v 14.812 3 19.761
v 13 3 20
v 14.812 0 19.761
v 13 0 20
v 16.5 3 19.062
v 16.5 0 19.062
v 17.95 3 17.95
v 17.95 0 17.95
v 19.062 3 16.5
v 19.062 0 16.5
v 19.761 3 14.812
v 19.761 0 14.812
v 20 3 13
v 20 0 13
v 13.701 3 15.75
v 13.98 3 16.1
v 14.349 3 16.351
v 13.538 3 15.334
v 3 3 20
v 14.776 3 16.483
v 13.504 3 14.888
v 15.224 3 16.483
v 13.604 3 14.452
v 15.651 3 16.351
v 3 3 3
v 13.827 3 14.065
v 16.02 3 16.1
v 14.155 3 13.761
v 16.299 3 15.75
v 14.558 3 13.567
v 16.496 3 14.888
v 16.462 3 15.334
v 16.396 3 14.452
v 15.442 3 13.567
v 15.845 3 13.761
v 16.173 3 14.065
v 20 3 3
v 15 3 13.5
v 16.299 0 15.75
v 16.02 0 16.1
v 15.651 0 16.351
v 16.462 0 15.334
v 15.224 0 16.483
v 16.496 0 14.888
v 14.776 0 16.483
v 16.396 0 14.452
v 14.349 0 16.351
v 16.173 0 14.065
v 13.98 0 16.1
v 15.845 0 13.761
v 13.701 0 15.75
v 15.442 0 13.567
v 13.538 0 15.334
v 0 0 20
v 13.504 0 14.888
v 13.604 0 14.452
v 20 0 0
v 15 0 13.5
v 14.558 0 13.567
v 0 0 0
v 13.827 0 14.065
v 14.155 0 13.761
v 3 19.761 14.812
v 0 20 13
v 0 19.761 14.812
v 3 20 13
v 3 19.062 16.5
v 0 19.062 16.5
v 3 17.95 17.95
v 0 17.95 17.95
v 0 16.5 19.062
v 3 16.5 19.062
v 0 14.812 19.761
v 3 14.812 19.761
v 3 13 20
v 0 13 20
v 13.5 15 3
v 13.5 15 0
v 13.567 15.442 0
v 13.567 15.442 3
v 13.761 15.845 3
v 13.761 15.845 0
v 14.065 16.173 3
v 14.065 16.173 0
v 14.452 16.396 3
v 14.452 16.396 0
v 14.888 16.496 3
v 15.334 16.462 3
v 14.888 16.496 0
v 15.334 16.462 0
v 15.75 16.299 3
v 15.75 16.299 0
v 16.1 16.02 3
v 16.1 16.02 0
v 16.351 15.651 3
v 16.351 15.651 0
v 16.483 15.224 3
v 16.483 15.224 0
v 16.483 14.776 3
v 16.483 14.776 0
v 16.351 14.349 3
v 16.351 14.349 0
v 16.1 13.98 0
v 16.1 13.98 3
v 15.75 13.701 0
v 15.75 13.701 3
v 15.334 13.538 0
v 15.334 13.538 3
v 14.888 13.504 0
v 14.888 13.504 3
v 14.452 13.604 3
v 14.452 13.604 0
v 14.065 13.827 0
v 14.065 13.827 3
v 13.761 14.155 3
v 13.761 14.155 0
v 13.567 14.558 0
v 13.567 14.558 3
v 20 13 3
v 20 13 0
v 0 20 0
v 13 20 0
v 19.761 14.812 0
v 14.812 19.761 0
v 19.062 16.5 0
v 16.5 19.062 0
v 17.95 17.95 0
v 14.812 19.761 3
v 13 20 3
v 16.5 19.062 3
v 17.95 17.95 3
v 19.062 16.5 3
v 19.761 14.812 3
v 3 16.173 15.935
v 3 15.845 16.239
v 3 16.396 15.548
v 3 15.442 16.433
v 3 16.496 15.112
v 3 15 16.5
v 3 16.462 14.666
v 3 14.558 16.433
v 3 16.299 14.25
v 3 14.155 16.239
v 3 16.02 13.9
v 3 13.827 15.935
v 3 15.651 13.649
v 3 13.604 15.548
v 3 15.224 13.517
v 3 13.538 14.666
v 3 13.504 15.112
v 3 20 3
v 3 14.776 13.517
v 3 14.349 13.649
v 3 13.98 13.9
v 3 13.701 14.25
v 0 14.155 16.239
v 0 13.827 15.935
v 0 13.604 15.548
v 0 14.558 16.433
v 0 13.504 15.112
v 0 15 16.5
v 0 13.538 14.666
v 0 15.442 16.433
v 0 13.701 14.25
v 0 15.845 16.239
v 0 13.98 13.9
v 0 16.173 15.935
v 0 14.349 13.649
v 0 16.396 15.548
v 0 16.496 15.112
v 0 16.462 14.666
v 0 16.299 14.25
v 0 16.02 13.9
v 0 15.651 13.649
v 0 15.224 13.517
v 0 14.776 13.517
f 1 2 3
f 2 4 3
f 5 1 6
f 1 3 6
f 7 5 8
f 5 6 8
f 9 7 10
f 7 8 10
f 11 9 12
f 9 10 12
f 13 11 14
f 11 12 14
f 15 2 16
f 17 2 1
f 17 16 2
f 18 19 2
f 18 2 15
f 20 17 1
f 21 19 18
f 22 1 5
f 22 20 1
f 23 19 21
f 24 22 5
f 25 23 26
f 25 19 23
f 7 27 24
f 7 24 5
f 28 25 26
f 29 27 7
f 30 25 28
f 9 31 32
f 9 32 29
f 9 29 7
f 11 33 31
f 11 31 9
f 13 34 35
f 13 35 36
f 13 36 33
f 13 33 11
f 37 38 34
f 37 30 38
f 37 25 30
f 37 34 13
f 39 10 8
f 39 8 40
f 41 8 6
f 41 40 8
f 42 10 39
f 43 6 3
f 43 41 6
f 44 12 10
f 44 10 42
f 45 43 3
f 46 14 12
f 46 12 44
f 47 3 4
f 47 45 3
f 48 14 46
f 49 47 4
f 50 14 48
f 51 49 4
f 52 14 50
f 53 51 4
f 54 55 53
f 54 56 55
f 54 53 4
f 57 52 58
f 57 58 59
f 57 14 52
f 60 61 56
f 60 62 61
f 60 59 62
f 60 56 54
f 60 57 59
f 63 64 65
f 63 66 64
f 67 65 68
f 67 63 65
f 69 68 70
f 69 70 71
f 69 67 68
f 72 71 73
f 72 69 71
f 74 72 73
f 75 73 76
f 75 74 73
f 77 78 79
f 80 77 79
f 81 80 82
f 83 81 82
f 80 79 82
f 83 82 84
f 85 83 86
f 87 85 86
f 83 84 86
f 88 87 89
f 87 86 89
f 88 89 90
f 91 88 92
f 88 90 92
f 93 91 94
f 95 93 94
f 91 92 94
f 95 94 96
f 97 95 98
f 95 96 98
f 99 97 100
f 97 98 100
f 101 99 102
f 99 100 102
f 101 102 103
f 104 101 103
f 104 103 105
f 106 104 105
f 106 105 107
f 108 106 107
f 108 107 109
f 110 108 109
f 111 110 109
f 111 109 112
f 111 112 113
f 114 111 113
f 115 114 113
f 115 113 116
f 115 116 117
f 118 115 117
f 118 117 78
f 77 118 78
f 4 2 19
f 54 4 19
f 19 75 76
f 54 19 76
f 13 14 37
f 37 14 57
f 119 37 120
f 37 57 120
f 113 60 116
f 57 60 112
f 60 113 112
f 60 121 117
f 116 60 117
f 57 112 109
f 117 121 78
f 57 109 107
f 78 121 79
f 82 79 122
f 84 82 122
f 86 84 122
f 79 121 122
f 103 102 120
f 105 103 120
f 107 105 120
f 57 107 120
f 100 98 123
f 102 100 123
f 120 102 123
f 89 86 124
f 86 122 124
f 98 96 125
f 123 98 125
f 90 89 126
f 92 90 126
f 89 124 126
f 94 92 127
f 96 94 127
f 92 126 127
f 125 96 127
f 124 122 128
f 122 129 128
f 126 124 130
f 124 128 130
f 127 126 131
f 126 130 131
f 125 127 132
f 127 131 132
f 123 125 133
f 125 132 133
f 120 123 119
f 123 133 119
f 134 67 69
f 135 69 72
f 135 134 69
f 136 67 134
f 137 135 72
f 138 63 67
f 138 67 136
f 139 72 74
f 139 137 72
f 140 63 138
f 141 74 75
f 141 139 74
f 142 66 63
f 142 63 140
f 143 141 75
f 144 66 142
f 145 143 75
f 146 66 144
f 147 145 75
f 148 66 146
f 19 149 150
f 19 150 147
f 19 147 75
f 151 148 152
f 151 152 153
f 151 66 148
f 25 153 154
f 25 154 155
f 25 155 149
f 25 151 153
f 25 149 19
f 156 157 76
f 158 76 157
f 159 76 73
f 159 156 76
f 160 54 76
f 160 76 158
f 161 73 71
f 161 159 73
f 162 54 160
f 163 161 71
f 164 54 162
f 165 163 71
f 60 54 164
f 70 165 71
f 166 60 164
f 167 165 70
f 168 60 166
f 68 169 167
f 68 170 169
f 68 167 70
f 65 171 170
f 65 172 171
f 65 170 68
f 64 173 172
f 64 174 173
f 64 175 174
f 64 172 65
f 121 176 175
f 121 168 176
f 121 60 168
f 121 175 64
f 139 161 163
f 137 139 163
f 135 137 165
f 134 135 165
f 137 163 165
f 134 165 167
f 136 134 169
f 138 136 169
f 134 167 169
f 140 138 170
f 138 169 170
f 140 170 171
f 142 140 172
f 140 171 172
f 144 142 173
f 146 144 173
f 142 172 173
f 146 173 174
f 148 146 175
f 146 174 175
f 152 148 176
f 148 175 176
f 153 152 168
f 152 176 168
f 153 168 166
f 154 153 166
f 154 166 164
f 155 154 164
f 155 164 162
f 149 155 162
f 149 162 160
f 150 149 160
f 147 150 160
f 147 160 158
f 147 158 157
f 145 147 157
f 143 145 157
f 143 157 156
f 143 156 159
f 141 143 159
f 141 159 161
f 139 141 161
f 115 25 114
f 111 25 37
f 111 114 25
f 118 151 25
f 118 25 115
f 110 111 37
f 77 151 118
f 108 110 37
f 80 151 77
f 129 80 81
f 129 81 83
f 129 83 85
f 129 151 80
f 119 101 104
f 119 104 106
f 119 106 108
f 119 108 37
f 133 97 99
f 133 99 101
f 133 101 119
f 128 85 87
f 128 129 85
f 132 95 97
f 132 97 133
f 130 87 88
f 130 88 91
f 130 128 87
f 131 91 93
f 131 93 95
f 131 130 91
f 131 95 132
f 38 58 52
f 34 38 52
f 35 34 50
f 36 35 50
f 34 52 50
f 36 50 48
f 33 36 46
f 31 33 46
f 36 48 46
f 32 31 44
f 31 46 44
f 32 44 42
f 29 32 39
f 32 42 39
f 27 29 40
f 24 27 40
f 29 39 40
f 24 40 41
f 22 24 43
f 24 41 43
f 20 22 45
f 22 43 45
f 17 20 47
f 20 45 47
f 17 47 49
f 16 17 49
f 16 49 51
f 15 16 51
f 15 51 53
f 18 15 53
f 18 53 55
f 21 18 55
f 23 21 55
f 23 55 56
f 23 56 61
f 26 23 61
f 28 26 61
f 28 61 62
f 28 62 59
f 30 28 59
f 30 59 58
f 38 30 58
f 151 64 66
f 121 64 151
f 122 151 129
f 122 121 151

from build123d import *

# Parameters (mm, degrees)
SKETCH1_W           = 20
SKETCH1_H           = 20
BOSS_EXTRUDE1_DEPTH = 3
BOSS_EXTRUDE2_DEPTH = 17
SKETCH3_R           = 1.5
CUT_EXTRUDE1_DEPTH  = 17
SKETCH4_R           = 1.5
CUT_EXTRUDE2_DEPTH  = 17
SKETCH5_R           = 1.5
CUT_EXTRUDE3_DEPTH  = 17
FILLET1_R           = 7


with BuildPart() as part:
    # Sketch1 → Boss-Extrude1 (new body)
    with BuildSketch(Plane.XY):
        with Locations((10, 10)):
            Rectangle(SKETCH1_W, SKETCH1_H)
    extrude(amount=BOSS_EXTRUDE1_DEPTH)

    # Sketch2 → Boss-Extrude2 (add)
    with BuildSketch(Plane.XY.offset(3)):
        Polygon((0, 20), (3, 20), (3, 3), (20, 3), (20, 0), (0, 0), align=None)
    extrude(amount=BOSS_EXTRUDE2_DEPTH)

    # Sketch3 → Cut-Extrude1 (cut)
    with BuildSketch(Plane.ZY):
        with Locations((15, 15)):
            Circle(SKETCH3_R)
    extrude(amount=-CUT_EXTRUDE1_DEPTH, mode=Mode.SUBTRACT)

    # Sketch4 → Cut-Extrude2 (cut)
    with BuildSketch(Plane(origin=(0, 0, 0), x_dir=(-1, 0, 0), z_dir=(0, 0, -1))):
        with Locations((-15, 15)):
            Circle(SKETCH4_R)
    extrude(amount=-CUT_EXTRUDE2_DEPTH, mode=Mode.SUBTRACT)

    # Sketch5 → Cut-Extrude3 (cut)
    with BuildSketch(Plane(origin=(0, 0, 0), x_dir=(-1, 0, 0), z_dir=(0, -1, 0))):
        with Locations(Location((-15, -15, 0), (0, 0, 90))):
            Circle(SKETCH5_R)
    extrude(amount=-CUT_EXTRUDE3_DEPTH, mode=Mode.SUBTRACT)

    # Fillet1
    fillet1_edges = [part.edges().sort_by_distance(p)[0] for p in [
        (20, 1.5, 20),
        (1.5, 20, 20),
        (20, 20, 1.5),
    ]]
    fillet(fillet1_edges, radius=FILLET1_R)


solid = part.part
